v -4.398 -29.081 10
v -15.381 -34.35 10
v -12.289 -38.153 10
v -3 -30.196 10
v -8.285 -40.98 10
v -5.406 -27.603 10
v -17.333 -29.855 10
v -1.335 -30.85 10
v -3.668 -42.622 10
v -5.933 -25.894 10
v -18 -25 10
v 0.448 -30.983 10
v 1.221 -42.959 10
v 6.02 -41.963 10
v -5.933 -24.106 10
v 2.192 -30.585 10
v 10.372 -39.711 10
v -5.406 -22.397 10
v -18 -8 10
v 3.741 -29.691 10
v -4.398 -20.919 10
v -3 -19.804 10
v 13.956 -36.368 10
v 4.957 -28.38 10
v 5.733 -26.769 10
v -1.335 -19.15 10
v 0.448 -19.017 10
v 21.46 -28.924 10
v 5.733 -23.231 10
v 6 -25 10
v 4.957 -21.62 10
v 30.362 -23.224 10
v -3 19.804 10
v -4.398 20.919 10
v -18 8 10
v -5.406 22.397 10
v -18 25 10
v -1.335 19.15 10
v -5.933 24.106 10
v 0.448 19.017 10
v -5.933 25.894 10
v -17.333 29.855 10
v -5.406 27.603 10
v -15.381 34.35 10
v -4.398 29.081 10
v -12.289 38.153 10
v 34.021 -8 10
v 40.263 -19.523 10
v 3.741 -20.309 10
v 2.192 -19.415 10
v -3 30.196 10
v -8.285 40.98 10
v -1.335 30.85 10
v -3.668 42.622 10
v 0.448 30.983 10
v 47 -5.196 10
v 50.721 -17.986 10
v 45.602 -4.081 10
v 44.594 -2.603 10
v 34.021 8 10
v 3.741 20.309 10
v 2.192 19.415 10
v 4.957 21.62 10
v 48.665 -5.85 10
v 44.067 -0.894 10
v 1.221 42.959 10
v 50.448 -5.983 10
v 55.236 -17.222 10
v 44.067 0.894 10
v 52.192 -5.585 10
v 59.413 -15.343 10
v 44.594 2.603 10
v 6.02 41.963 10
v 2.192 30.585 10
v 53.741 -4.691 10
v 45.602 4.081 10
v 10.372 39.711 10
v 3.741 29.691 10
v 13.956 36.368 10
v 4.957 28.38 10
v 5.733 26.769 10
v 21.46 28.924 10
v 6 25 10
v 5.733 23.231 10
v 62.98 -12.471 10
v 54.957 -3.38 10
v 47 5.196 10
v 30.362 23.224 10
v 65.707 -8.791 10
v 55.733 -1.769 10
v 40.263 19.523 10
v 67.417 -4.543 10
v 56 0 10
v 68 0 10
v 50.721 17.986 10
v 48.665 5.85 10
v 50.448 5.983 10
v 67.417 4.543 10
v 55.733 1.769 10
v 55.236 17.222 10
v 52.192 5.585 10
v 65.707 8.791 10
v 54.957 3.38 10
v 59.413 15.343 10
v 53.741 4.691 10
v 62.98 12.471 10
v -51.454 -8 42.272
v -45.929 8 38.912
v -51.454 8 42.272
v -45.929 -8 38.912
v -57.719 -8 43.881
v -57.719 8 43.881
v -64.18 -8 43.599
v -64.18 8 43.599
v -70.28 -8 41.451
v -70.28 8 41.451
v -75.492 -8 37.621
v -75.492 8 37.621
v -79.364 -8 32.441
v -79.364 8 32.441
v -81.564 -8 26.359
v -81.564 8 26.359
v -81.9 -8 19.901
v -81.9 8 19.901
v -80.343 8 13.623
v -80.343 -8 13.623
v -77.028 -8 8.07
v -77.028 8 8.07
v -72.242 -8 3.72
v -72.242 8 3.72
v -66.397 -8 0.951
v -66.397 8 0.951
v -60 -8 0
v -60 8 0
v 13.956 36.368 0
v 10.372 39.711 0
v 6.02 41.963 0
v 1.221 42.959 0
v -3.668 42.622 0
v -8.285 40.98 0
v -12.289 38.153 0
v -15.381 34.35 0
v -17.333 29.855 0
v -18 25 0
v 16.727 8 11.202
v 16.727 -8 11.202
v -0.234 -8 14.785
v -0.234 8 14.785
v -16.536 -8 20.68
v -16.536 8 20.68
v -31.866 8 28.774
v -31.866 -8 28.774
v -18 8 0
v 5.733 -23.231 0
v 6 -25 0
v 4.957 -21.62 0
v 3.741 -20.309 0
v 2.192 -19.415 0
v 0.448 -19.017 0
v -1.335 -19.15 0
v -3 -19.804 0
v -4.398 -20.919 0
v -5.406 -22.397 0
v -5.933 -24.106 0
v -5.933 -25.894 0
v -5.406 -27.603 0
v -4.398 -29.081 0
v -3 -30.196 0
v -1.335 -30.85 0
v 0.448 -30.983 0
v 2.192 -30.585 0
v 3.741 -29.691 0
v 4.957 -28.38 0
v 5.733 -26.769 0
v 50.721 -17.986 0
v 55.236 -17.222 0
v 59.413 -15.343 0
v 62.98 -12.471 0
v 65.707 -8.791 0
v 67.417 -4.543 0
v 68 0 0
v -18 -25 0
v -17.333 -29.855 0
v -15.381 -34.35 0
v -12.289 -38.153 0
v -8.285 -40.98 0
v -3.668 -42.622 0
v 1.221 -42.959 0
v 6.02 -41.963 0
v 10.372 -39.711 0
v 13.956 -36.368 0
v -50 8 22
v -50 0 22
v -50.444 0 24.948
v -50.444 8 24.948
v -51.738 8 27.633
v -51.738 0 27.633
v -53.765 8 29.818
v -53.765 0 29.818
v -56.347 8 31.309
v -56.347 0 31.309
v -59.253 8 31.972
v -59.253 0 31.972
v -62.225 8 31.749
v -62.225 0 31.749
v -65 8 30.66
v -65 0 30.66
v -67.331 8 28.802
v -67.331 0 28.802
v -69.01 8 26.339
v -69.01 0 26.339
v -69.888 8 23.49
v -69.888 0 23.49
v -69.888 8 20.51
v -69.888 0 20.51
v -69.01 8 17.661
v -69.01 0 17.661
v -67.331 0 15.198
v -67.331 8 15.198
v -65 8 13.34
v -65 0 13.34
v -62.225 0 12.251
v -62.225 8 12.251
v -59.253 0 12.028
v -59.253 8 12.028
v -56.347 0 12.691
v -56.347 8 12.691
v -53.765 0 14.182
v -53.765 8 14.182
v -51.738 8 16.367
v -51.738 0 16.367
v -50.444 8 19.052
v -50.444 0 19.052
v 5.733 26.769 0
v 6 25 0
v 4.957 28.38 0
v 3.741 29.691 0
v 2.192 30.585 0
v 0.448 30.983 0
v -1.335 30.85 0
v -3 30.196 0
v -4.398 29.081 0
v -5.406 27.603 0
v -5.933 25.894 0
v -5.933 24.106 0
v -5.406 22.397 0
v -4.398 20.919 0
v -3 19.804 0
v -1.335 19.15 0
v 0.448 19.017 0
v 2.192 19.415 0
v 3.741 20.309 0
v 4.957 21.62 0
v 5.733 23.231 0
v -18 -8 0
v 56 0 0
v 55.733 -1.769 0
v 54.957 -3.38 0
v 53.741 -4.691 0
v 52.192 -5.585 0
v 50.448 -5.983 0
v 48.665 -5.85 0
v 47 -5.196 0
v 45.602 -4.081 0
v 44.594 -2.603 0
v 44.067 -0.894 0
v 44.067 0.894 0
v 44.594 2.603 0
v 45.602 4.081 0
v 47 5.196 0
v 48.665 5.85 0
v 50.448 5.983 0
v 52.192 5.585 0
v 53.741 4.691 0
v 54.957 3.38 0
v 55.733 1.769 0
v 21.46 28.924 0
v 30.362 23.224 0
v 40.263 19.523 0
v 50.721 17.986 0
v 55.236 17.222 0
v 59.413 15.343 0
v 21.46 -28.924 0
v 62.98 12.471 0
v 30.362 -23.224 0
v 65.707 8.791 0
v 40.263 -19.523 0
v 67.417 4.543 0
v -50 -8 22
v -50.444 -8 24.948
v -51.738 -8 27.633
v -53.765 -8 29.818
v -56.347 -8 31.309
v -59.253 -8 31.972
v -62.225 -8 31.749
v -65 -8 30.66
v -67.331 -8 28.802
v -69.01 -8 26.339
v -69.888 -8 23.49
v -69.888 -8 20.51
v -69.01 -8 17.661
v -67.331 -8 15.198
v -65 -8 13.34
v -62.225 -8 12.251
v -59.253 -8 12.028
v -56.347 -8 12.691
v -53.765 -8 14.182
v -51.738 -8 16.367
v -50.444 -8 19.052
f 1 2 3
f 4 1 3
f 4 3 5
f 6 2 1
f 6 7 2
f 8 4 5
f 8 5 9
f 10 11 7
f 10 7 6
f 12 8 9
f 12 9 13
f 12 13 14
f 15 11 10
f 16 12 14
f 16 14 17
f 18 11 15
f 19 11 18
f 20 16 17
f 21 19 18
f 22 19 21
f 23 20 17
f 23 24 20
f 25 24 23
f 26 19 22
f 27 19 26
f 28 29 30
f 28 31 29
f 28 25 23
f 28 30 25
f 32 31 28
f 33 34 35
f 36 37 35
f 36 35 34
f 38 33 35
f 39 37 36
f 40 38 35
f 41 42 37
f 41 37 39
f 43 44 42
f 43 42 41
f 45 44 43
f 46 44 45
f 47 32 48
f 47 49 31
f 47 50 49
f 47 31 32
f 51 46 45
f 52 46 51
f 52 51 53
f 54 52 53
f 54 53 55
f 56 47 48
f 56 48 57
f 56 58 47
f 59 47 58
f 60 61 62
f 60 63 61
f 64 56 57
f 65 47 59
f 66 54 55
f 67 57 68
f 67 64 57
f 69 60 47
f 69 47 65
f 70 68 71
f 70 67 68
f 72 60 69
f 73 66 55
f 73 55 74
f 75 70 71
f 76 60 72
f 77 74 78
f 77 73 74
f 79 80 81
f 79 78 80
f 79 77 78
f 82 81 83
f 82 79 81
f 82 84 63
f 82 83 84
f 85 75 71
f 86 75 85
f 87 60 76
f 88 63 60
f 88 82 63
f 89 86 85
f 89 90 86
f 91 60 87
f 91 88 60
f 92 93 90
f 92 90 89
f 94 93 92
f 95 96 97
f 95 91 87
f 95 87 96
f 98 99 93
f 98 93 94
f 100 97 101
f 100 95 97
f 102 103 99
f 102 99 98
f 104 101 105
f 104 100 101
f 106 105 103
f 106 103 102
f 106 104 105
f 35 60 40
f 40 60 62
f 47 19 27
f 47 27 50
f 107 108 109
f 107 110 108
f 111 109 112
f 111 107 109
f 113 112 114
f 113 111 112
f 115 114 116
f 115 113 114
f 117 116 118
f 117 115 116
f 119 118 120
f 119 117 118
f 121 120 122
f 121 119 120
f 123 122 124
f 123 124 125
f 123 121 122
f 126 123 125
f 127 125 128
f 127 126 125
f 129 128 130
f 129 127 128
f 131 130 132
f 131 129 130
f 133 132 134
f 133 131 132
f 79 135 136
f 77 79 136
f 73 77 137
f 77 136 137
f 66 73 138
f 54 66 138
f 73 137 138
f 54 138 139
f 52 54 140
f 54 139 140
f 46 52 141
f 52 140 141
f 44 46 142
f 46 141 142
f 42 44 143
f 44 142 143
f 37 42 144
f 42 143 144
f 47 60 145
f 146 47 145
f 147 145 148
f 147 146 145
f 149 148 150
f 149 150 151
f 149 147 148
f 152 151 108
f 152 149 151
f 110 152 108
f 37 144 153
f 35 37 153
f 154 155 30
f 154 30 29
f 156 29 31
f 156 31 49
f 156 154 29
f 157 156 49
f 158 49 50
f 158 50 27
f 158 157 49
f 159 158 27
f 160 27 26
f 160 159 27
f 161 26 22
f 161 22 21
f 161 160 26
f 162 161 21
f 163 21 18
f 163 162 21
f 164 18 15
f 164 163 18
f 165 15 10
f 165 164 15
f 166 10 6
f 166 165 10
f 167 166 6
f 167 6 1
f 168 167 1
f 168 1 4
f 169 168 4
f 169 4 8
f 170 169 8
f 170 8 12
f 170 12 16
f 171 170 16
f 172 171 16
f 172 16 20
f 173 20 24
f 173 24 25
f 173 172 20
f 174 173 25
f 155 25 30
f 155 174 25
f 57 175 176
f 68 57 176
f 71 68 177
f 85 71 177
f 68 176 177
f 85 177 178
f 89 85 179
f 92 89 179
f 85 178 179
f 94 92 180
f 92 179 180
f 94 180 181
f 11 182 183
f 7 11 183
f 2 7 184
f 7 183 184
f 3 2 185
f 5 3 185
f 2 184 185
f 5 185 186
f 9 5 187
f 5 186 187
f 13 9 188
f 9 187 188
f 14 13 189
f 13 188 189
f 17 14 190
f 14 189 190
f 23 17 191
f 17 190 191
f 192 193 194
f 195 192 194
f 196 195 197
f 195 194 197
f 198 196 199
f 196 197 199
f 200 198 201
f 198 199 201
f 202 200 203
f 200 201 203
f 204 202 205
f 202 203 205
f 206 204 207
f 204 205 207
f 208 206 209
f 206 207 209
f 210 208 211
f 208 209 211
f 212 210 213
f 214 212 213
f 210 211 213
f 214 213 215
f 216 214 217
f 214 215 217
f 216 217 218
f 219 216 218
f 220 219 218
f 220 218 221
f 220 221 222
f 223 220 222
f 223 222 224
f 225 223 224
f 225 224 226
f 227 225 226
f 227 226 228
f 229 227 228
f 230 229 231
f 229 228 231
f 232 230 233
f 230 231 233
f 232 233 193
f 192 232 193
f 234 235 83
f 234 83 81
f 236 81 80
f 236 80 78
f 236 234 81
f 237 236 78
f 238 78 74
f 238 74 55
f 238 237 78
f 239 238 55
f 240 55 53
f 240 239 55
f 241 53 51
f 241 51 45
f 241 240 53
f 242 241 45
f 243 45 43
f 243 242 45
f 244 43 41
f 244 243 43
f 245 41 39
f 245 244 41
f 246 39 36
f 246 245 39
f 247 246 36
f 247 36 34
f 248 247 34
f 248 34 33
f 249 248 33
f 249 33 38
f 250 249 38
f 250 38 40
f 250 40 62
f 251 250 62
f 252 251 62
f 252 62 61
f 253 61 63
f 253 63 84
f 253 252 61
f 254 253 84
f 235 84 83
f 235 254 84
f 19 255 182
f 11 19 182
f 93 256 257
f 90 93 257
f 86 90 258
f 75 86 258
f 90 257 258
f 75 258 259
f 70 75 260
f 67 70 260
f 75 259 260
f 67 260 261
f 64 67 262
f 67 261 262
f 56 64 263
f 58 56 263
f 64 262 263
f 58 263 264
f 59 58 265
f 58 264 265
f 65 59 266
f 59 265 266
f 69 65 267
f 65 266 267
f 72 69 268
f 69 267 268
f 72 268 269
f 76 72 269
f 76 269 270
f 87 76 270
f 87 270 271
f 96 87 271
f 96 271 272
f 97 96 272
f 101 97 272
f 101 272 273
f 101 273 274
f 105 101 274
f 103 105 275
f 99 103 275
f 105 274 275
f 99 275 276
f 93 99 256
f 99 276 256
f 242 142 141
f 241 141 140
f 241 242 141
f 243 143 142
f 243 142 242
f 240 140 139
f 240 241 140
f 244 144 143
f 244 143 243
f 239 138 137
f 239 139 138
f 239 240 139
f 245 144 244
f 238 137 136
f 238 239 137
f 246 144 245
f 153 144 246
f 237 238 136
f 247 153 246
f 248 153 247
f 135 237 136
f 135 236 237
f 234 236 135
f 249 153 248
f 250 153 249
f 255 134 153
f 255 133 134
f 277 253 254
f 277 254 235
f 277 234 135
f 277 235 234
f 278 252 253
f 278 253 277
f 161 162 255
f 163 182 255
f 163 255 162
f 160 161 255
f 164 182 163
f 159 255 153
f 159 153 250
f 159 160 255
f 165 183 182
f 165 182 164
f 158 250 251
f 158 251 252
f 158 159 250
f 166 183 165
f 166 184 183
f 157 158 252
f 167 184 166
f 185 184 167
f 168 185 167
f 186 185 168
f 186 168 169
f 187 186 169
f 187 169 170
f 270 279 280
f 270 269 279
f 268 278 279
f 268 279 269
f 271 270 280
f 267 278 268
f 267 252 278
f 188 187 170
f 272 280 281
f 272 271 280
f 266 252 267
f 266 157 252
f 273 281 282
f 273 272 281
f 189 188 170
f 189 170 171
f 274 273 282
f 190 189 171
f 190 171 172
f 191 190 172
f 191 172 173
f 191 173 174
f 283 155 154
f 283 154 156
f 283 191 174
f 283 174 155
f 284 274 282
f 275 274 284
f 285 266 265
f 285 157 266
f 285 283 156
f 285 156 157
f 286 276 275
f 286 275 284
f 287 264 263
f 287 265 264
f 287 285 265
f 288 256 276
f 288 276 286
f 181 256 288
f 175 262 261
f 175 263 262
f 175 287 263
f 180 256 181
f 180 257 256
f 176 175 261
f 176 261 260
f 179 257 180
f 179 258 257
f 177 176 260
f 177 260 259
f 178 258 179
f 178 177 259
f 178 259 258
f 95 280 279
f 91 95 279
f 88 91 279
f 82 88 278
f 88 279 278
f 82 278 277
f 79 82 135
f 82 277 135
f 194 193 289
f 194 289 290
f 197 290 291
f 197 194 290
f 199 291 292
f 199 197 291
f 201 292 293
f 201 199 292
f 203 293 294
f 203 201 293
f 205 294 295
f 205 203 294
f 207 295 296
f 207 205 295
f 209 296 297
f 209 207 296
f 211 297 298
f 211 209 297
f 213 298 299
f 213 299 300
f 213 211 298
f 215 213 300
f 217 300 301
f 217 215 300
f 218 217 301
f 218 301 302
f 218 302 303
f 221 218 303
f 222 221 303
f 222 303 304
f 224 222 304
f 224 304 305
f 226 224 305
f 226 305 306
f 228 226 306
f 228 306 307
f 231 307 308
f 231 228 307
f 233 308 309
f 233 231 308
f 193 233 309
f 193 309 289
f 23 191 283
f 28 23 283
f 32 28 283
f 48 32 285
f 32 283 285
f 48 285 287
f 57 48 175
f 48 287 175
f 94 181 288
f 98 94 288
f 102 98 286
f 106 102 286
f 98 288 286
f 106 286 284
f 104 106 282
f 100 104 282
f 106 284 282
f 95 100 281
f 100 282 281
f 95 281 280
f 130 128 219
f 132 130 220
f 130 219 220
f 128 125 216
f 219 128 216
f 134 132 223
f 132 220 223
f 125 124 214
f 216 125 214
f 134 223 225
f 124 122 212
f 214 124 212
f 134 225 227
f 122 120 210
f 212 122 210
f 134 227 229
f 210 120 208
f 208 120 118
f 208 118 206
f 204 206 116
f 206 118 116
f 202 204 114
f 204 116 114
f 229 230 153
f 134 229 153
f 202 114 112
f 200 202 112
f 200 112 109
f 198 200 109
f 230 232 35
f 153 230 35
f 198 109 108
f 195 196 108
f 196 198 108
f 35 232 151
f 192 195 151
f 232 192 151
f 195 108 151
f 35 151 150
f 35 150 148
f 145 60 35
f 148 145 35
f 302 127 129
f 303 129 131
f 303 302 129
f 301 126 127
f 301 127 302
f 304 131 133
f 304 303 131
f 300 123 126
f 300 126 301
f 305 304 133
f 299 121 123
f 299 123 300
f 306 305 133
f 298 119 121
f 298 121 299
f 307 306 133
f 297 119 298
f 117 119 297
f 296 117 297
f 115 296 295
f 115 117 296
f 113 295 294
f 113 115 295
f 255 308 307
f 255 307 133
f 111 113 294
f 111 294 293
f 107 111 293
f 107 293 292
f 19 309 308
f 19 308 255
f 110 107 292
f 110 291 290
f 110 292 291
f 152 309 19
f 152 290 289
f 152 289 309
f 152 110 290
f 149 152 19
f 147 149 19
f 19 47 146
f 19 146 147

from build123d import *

# Parameters (mm, degrees)
F0_R          = 6
F1_DEPTH      = 10
F2_R          = 10
F3_DEPTH      = 8
F3_DEPTH_BACK = 8


with BuildPart() as f1:
    # F0 (on Top) → F1 (new body)
    with BuildSketch(Plane.XY):
        with BuildLine():
            ThreePointArc((50.720724, 17.985565), (30.362055, 23.224109), (13.956018, 36.367918))
            ThreePointArc((13.956018, 36.367918), (-6.032896, 41.958896), (-18, 25))
            Line((-18, 25), (-18, 0))
            Line((-18, 0), (-18, -25))
            ThreePointArc((-18, -25), (-6.032896, -41.958896), (13.956018, -36.367918))
            ThreePointArc((13.956018, -36.367918), (30.362055, -23.224109), (50.720724, -17.985565))
            ThreePointArc((50.720724, -17.985565), (62.980236, -12.470505), (68, 0))
            ThreePointArc((68, 0), (62.980236, 12.470505), (50.720724, 17.985565))
        make_face()
        with Locations((0, -25)):
            Circle(F0_R, mode=Mode.SUBTRACT)
        with Locations((0, 25)):
            Circle(F0_R, mode=Mode.SUBTRACT)
        with BuildLine():
            ThreePointArc((44, 0), (50, 6), (56, 0))
            ThreePointArc((56, 0), (50, -6), (44, 0))
        make_face(mode=Mode.SUBTRACT)
    extrude(amount=F1_DEPTH)

    # F2 (on Front) → F3 (join, two sides)
    with BuildSketch(Plane.XZ) as f3_sk:
        with BuildLine():
            Line((-60, 0), (0, 0))
            Line((0, 0), (34.021274, 0))
            Line((34.021274, 0), (34.021274, 10))
            ThreePointArc((34.021274, 10), (-8.487228, 17.449895), (-45.928789, 38.911565))
            ThreePointArc((-45.928789, 38.911565), (-80.688818, 29.481496), (-60, 0))
        make_face()
        with Locations((-60, 22)):
            Circle(F2_R, mode=Mode.SUBTRACT)
    extrude(amount=F3_DEPTH)
    extrude(f3_sk.sketch, amount=-F3_DEPTH_BACK)


solid = f1.part
